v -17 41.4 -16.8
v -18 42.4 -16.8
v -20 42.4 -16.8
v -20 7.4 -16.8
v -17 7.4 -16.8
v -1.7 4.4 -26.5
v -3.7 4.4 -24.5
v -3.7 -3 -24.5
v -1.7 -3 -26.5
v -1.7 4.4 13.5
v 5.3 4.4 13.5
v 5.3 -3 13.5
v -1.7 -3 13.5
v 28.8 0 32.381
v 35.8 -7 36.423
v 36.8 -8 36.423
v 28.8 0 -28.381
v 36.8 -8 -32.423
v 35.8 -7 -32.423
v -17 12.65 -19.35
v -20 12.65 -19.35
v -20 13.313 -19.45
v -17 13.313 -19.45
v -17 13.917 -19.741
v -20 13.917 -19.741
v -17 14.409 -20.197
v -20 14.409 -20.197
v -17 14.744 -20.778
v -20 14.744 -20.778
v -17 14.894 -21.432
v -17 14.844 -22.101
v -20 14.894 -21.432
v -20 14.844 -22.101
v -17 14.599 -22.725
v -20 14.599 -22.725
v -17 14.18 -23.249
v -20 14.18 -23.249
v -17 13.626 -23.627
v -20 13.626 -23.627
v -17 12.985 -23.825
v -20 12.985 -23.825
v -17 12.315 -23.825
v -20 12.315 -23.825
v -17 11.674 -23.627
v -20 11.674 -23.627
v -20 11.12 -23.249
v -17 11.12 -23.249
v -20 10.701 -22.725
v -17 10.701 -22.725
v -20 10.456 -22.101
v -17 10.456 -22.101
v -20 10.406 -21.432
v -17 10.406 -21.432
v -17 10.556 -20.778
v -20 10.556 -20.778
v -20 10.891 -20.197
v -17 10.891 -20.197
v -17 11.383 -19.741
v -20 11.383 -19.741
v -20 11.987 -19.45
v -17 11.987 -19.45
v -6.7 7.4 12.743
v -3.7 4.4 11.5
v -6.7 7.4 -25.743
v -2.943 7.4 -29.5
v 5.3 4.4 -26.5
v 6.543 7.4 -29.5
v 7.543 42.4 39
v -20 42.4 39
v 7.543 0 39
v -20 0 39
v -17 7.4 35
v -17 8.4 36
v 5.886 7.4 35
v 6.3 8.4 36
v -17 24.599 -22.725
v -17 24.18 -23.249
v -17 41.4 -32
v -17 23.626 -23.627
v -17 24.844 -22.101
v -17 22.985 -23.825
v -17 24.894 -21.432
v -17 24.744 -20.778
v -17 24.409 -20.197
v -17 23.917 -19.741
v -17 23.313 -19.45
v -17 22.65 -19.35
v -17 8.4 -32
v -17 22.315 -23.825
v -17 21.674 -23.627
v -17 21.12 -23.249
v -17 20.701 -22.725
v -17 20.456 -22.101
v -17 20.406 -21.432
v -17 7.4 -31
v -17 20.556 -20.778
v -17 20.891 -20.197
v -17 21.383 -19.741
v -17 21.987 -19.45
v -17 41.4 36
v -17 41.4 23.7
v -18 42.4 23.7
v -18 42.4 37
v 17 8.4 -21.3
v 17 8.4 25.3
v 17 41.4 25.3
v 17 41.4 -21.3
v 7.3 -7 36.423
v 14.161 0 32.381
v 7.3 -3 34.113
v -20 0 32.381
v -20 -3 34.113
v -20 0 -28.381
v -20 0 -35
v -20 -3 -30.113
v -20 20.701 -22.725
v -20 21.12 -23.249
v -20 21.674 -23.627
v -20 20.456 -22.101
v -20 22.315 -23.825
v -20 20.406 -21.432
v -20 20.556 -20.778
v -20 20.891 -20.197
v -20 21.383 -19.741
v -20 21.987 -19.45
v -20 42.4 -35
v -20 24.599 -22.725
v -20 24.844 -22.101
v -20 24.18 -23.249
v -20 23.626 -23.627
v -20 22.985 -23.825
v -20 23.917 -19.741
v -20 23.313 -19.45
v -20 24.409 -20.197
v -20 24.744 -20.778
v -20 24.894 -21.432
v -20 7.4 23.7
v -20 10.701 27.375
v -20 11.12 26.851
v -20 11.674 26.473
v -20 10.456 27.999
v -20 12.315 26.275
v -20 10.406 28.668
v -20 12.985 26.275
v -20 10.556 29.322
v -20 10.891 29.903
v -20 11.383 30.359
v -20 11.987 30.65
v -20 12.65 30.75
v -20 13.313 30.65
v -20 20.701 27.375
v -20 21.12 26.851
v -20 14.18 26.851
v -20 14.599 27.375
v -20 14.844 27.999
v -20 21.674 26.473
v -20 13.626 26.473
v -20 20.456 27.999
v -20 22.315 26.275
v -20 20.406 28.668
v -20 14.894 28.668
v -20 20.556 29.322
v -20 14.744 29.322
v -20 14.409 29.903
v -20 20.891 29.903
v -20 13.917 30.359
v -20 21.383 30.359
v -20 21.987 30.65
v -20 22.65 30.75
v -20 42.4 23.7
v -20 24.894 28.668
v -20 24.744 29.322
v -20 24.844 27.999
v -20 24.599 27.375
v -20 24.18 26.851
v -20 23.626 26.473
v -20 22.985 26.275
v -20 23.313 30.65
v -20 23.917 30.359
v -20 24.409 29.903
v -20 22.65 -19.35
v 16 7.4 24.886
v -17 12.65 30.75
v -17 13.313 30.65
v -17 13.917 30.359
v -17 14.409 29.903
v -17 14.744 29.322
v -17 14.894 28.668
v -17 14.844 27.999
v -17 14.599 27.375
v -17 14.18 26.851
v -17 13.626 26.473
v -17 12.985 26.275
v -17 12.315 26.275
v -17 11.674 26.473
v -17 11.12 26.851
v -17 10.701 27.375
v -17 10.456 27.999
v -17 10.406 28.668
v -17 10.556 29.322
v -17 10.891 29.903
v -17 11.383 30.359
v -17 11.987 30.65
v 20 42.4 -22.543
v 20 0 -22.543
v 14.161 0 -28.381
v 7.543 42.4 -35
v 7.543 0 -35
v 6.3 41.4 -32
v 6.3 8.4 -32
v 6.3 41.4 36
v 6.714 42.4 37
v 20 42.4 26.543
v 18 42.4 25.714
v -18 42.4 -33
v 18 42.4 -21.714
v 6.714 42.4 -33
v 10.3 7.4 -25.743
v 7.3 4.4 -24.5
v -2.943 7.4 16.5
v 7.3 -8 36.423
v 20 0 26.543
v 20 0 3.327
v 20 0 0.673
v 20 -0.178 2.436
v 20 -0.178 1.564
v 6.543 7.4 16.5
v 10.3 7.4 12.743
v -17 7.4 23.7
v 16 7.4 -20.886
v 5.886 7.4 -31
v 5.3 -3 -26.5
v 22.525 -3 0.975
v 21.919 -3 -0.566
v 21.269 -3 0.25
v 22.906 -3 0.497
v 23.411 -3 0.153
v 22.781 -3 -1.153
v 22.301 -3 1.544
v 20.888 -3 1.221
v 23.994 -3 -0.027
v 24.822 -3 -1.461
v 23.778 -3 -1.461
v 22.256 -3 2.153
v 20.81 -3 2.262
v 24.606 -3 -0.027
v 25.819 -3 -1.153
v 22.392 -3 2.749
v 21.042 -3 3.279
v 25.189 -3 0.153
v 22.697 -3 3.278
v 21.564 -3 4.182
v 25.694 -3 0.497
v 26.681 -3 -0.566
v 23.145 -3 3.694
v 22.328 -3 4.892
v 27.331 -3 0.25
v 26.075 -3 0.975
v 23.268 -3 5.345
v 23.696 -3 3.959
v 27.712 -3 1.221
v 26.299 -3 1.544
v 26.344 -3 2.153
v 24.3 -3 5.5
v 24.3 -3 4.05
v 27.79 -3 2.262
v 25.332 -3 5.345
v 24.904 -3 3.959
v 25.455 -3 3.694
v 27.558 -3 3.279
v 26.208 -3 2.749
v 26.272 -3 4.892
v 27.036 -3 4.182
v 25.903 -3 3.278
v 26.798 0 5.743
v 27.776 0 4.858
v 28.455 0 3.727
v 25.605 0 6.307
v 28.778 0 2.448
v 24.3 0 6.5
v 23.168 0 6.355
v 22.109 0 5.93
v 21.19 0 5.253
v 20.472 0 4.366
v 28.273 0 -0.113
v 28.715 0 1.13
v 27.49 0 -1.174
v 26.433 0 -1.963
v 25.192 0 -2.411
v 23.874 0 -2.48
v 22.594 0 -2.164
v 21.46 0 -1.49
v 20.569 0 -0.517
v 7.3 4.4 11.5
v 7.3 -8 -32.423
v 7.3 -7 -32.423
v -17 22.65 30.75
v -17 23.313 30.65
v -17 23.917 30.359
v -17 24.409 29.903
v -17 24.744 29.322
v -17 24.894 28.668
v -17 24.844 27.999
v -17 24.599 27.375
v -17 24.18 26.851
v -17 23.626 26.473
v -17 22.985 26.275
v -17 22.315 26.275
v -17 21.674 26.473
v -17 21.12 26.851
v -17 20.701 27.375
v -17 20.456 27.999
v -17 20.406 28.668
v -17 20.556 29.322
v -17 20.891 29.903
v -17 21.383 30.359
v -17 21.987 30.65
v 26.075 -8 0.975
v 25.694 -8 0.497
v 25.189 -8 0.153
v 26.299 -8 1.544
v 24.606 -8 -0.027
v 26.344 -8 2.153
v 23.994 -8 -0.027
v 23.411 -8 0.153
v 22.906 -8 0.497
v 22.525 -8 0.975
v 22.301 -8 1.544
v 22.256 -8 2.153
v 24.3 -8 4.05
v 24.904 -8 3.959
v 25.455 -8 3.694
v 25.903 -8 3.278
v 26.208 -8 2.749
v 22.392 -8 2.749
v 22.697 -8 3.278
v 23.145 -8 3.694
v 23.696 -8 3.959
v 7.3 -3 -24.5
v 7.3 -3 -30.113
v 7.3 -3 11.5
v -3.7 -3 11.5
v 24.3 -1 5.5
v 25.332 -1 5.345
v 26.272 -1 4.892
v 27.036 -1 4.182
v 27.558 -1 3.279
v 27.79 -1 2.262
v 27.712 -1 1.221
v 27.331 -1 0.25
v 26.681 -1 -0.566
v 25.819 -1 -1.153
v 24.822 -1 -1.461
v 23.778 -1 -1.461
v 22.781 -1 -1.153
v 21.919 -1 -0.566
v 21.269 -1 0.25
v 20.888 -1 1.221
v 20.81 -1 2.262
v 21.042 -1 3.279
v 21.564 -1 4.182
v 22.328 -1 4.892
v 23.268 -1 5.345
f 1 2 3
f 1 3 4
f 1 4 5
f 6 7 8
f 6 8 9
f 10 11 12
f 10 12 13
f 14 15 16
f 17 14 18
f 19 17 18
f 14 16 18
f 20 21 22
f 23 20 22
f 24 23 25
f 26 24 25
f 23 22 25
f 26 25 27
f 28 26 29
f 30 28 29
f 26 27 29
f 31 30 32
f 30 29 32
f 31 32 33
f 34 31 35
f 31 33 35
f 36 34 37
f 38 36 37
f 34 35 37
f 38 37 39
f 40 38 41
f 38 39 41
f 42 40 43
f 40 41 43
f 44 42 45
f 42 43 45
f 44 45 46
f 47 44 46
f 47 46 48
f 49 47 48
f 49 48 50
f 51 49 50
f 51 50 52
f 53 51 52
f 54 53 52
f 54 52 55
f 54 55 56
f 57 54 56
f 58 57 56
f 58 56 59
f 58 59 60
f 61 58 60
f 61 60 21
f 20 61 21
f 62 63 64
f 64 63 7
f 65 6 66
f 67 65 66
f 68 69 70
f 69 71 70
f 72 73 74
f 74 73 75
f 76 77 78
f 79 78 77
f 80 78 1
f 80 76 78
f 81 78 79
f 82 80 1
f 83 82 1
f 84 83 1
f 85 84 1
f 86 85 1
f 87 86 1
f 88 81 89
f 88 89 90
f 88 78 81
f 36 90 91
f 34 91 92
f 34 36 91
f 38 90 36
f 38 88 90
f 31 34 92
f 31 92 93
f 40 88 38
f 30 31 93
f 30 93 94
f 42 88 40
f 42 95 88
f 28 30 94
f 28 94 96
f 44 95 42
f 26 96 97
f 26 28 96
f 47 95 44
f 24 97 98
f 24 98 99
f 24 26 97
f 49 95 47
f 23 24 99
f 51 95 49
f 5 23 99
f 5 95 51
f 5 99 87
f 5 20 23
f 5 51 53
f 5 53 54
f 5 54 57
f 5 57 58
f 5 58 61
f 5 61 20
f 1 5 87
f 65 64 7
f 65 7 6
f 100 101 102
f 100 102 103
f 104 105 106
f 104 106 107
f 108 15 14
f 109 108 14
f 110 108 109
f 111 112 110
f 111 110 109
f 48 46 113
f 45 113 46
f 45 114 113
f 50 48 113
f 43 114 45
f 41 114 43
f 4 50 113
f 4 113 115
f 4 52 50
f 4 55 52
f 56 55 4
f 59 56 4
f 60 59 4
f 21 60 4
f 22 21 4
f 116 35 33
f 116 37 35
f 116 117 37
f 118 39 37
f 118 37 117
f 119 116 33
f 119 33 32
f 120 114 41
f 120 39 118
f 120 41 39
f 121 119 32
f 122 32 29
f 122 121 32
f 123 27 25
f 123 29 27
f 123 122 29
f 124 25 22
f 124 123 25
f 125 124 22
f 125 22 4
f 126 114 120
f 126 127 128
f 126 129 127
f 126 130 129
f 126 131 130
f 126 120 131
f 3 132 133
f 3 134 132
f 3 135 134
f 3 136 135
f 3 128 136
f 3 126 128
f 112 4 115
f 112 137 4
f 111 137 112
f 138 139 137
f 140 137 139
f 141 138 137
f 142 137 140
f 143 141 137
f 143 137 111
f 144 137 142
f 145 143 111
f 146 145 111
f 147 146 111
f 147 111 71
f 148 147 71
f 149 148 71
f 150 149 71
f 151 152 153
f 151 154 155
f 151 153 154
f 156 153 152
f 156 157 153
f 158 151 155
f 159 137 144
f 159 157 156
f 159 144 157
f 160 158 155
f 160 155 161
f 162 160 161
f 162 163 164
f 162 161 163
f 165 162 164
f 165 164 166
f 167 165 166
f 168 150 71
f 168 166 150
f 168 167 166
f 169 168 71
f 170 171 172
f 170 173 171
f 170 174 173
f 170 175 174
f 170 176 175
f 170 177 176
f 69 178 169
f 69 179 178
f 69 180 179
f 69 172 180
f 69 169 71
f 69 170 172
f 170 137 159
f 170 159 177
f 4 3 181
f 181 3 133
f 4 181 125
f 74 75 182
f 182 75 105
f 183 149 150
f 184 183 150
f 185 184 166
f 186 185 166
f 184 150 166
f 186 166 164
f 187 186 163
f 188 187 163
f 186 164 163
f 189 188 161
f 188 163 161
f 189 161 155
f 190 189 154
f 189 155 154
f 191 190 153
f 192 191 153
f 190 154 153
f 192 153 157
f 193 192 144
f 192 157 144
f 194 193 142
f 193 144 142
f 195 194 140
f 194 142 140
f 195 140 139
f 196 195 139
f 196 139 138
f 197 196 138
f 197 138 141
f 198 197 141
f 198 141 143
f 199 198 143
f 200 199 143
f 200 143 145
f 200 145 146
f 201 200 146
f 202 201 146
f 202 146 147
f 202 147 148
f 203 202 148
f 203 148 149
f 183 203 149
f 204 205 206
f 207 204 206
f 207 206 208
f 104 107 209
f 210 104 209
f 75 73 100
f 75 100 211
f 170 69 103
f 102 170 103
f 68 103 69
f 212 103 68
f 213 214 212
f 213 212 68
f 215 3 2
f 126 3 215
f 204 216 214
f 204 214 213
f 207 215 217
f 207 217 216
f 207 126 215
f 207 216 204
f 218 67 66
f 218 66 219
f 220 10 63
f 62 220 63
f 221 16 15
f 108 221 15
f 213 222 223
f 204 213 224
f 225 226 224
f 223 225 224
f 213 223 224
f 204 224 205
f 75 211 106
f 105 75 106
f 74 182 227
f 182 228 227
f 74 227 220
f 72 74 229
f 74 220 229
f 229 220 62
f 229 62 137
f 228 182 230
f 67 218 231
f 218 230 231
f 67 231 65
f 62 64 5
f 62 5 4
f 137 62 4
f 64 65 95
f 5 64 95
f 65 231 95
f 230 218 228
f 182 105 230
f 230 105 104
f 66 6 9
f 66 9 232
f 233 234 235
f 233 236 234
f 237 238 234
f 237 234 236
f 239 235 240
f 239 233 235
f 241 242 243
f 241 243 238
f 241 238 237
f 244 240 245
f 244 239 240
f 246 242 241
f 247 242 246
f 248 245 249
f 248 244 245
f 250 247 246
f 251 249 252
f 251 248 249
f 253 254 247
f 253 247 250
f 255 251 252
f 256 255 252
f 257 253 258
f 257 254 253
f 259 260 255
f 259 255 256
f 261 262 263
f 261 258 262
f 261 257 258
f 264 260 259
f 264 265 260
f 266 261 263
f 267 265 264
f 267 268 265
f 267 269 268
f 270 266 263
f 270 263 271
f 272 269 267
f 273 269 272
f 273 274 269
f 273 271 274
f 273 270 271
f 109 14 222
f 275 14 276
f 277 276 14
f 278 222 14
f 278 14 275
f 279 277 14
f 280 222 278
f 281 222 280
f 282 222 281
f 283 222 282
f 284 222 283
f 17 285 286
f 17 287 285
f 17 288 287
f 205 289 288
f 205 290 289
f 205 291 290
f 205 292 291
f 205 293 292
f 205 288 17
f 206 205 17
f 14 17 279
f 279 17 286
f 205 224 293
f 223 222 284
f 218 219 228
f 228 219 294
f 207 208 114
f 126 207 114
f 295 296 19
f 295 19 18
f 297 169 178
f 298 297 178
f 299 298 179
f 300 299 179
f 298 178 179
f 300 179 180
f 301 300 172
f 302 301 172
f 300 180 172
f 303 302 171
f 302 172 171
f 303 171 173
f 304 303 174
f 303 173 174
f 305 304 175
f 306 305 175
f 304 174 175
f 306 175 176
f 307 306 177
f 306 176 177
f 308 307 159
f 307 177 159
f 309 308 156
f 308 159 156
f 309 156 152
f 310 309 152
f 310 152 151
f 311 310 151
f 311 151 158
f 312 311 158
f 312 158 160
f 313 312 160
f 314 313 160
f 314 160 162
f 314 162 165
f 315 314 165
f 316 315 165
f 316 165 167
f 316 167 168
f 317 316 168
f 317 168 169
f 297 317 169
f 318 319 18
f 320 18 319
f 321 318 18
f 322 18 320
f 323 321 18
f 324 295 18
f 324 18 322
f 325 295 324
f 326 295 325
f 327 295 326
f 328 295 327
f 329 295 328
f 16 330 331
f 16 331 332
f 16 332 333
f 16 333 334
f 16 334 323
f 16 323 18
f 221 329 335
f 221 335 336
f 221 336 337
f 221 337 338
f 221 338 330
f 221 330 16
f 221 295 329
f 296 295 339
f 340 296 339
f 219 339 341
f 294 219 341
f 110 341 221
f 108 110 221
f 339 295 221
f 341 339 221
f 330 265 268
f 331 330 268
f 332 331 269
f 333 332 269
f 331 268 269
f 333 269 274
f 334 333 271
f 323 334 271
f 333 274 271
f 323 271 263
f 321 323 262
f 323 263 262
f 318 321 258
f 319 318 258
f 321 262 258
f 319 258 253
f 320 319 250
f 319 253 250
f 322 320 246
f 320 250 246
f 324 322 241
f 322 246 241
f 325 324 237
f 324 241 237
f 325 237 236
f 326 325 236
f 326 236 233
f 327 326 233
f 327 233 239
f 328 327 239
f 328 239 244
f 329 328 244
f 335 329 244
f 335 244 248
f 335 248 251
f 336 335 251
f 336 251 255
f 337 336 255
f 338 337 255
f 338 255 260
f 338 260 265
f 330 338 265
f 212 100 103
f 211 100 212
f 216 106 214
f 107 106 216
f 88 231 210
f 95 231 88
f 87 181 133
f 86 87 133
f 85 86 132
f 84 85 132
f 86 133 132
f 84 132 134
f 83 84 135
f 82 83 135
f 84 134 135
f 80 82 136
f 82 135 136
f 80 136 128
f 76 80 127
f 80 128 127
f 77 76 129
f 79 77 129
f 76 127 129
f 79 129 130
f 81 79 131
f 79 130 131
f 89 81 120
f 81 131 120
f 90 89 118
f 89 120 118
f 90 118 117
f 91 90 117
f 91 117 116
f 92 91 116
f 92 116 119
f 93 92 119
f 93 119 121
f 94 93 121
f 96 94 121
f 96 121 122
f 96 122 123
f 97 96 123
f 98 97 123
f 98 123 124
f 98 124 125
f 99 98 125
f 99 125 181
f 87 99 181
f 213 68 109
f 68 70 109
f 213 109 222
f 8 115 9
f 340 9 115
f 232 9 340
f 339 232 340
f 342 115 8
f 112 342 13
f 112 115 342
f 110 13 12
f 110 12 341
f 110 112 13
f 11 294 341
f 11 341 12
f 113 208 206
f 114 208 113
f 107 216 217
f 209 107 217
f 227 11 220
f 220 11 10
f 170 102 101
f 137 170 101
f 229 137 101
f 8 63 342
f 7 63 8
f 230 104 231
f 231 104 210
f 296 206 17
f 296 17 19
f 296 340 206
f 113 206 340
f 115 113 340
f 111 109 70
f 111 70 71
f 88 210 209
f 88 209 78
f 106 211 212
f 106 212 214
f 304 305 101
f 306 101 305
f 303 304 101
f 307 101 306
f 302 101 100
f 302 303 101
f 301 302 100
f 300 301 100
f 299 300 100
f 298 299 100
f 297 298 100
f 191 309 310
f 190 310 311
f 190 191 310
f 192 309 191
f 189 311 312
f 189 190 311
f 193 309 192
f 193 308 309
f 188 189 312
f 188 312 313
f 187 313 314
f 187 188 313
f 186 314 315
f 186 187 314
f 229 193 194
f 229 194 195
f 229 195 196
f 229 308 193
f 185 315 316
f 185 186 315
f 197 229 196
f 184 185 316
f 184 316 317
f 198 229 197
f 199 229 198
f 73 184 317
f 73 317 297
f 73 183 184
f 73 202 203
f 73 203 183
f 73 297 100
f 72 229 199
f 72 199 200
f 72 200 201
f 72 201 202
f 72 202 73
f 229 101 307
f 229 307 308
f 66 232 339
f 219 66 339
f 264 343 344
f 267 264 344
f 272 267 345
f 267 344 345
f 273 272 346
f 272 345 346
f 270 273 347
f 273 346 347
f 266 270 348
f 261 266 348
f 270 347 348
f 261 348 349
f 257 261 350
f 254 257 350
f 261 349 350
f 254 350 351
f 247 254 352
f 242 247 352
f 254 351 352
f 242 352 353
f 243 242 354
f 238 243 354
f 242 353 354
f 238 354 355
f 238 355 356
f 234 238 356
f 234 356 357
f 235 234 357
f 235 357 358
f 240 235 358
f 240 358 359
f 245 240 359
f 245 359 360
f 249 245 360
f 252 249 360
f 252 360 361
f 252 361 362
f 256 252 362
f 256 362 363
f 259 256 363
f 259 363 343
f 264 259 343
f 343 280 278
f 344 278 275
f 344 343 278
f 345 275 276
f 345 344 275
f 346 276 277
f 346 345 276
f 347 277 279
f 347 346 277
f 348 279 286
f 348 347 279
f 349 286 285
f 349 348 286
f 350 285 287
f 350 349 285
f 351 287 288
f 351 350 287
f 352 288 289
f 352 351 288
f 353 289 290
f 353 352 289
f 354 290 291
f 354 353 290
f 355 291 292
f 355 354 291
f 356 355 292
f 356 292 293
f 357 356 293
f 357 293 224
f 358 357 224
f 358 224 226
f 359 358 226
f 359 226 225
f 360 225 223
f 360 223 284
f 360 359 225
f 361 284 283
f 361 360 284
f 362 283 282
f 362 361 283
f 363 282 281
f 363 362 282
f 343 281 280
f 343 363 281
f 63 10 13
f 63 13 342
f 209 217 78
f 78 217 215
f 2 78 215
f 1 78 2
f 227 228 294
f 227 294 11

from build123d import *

# Parameters (mm, degrees)
MAIN_FACE_EXTRUDE_DEPTH              = 7.4
MAIN_WALLS_EXTRUDE_DEPTH             = 35
MAIN_WALLS_LOWER_CHAMFER_SIZE        = 1
MAIN_WALLS_ENTRY_CHAMFER_SIZE        = 1
SKETCH4_W                            = 3
SKETCH4_H                            = 40.5
SERVO_MOUNT_CUT_DEPTH                = 35
SERVO_MOUNT_HOLES_REACH              = 72.134
SKETCH5_R                            = 2.25
MOUNT_DOVETAIL_DEPTH                 = 56.8
MOUNT_DOVETAIL_CHAMFER_SIZE          = 8
SKETCH9_W                            = 27.3
SKETCH9_H                            = 68.845299462
DOVETAIL_OFFSET_CUT_DEPTH            = 5
SKETCH10_R                           = 2.05
MOUNT_SCREW_HOLE_DEPTH               = 69.359344643
SKETCH11_R                           = 3.5
MOUNT_SCREW_COUNTERSINK_DEPTH        = 3
MOUNT_SCREW_COUNTERSINK_CHAMFER_SIZE = 1
GEAR_CUT_DEPTH                       = 65.033116432
GEAR_ENTRY_CHAMFER_SIZE              = 3


# Some blends are built 0.0001 mm under size
with BuildPart() as part:
    # Sketch1 → Main Face Extrude (new body)
    with BuildSketch(Plane(origin=(0, 0, 0), x_dir=(1, 0, 0), z_dir=(0, 1, 0))):
        Polygon((-20, 35), (7.542640687, 35), (20, 22.542640687), (20, -26.542640687), (7.542640687, -39), (-20, -39), align=None)
    extrude(amount=MAIN_FACE_EXTRUDE_DEPTH)

    # Sketch3 → Main Walls Extrude (add)
    with BuildSketch(Plane(origin=(0, 7.4, 0), x_dir=(1, 0, 0), z_dir=(0, 1, 0))):
        Polygon((-20, 35), (-20, -39), (7.542640687, -39), (20, -26.542640687), (20, 22.542640687), (7.542640687, 35), align=None)
        Polygon((-17, 32), (-17, -36), (6.3, -36), (17, -25.3), (17, 21.3), (6.3, 32), align=None, mode=Mode.SUBTRACT)
    extrude(amount=MAIN_WALLS_EXTRUDE_DEPTH)

    # Main Walls Lower Chamfer
    main_walls_lower_chamfer_edges = [part.edges().sort_by_distance(p)[0] for p in [
        (-5.35, 7.4, -32),
        (-5.35, 7.4, 36),
        (11.65, 7.4, 30.65),
        (17, 7.4, 2),
        (11.65, 7.4, -26.65),
    ]]
    chamfer(main_walls_lower_chamfer_edges, length=MAIN_WALLS_LOWER_CHAMFER_SIZE)

    # Main Walls Entry Chamfer
    main_walls_entry_chamfer_edges = [part.edges().sort_by_distance(p)[0] for p in [
        (-5.35, 42.4, -32),
        (-17, 42.4, 2),
        (-5.35, 42.4, 36),
        (11.65, 42.4, 30.65),
        (17, 42.4, 2),
        (11.65, 42.4, -26.65),
    ]]
    chamfer(main_walls_entry_chamfer_edges, length=MAIN_WALLS_ENTRY_CHAMFER_SIZE)

    # Sketch4 → Servo Mount Cut (cut)
    with BuildSketch(Plane(origin=(0, 42.4, 0), x_dir=(1, 0, 0), z_dir=(0, 1, 0))):
        with Locations((-18.5, -3.45)):
            Rectangle(SKETCH4_W, SKETCH4_H)
    extrude(amount=-SERVO_MOUNT_CUT_DEPTH, mode=Mode.SUBTRACT)

    # Sketch5 → Servo Mount Holes (cut, up to next)
    with BuildSketch(Plane.ZY.offset(20), mode=Mode.PRIVATE) as servo_mount_holes_sk1:
        with Locations((-21.6, 22.65)):
            Circle(SKETCH5_R)
    servo_mount_holes_tool1 = extrude(servo_mount_holes_sk1.sketch, amount=-SERVO_MOUNT_HOLES_REACH, mode=Mode.PRIVATE) & part.part
    # Sketch5 → Servo Mount Holes (cut, up to next)
    with BuildSketch(Plane.ZY.offset(20), mode=Mode.PRIVATE) as servo_mount_holes_sk2:
        with Locations((-21.6, 12.65)):
            Circle(SKETCH5_R)
    servo_mount_holes_tool2 = extrude(servo_mount_holes_sk2.sketch, amount=-SERVO_MOUNT_HOLES_REACH, mode=Mode.PRIVATE) & part.part
    # Sketch5 → Servo Mount Holes (cut, up to next)
    with BuildSketch(Plane.ZY.offset(20), mode=Mode.PRIVATE) as servo_mount_holes_sk3:
        with Locations((28.5, 22.65)):
            Circle(SKETCH5_R)
    servo_mount_holes_tool3 = extrude(servo_mount_holes_sk3.sketch, amount=-SERVO_MOUNT_HOLES_REACH, mode=Mode.PRIVATE) & part.part
    # Sketch5 → Servo Mount Holes (cut, up to next)
    with BuildSketch(Plane.ZY.offset(20), mode=Mode.PRIVATE) as servo_mount_holes_sk4:
        with Locations((28.5, 12.65)):
            Circle(SKETCH5_R)
    servo_mount_holes_tool4 = extrude(servo_mount_holes_sk4.sketch, amount=-SERVO_MOUNT_HOLES_REACH, mode=Mode.PRIVATE) & part.part
    add(servo_mount_holes_tool1.solids().sort_by_distance((-20, 22.65, -21.6))[0], mode=Mode.SUBTRACT)
    add(servo_mount_holes_tool2.solids().sort_by_distance((-20, 12.65, -21.6))[0], mode=Mode.SUBTRACT)
    add(servo_mount_holes_tool3.solids().sort_by_distance((-20, 22.65, 28.5))[0], mode=Mode.SUBTRACT)
    add(servo_mount_holes_tool4.solids().sort_by_distance((-20, 12.65, 28.5))[0], mode=Mode.SUBTRACT)

    # Sketch8 → Mount Dovetail (add)
    with BuildSketch(Plane.ZY.offset(20)):
        Polygon((-28.381197846, 0), (-32.422649731, -7), (-32.422649731, -8), (36.422649731, -8), (36.422649731, -7), (32.381197846, 0), align=None)
    extrude(amount=-MOUNT_DOVETAIL_DEPTH)

    # Mount Dovetail Chamfer
    mount_dovetail_chamfer_edges = [part.edges().sort_by_distance(p)[0] for p in [
        (36.8, 0, 2),
    ]]
    chamfer(mount_dovetail_chamfer_edges, length=MOUNT_DOVETAIL_CHAMFER_SIZE - 0.0001)  # a hair under: the kernel refuses the full size

    # Sketch9 → Dovetail Offset Cut (cut)
    with BuildSketch(Plane.XZ.offset(8)):
        with Locations((-6.35, 2)):
            Rectangle(SKETCH9_W, SKETCH9_H)
    extrude(amount=-DOVETAIL_OFFSET_CUT_DEPTH, mode=Mode.SUBTRACT)

    # Sketch10 → Mount Screw Hole (cut, through all)
    with BuildSketch(Plane(origin=(0, 0, 0), x_dir=(1, 0, 0), z_dir=(0, 1, 0))):
        with Locations(Location((24.3, -2, 0), (0, 0, 270))):
            Circle(SKETCH10_R)
    extrude(amount=-MOUNT_SCREW_HOLE_DEPTH, mode=Mode.SUBTRACT)

    # Sketch11 → Mount Screw Countersink (cut)
    with BuildSketch(Plane(origin=(0, 0, 0), x_dir=(1, 0, 0), z_dir=(0, 1, 0))):
        with Locations(Location((24.3, -2, 0), (0, 0, 270))):
            Circle(SKETCH11_R)
    extrude(amount=-MOUNT_SCREW_COUNTERSINK_DEPTH, mode=Mode.SUBTRACT)

    # Mount Screw Countersink Chamfer
    # the kernel refuses this chamfer: 1 mm, written as the material it takes off along each edge
    with BuildSketch(Plane(origin=(24.3, 0, 2), x_dir=(0, 0, 1), z_dir=(-1, 0, 0))) as mount_screw_countersink_chamfer_piece_1_section:
        Polygon((3.5 + MOUNT_SCREW_COUNTERSINK_CHAMFER_SIZE, 0), (3.5, -MOUNT_SCREW_COUNTERSINK_CHAMFER_SIZE), (3.5, 0), align=None)
    mount_screw_countersink_chamfer_piece_1 = revolve(axis=Axis((24.3, 0, 2), (0, 1, 0)), mode=Mode.PRIVATE)
    mount_screw_countersink_chamfer_piece_1 = split(mount_screw_countersink_chamfer_piece_1, bisect_by=Plane(origin=(20, -0.483290811, -1.983290811), z_dir=(1, 0, 0)), keep=Keep.TOP, mode=Mode.PRIVATE)
    add(mount_screw_countersink_chamfer_piece_1, mode=Mode.SUBTRACT)

    # Sketch2 → Gear Cut (cut, through all)
    with BuildSketch(Plane(origin=(0, 7.4, 0), x_dir=(1, 0, 0), z_dir=(0, 1, 0))):
        Polygon((-1.7, 26.5), (5.3, 26.5), (7.3, 24.5), (7.3, -11.5), (5.3, -13.5), (-1.7, -13.5), (-3.7, -11.5), (-3.7, 24.5), align=None)
    extrude(amount=-GEAR_CUT_DEPTH, mode=Mode.SUBTRACT)

    # Gear Entry Chamfer
    gear_entry_chamfer_edges = [part.edges().sort_by_distance(p)[0] for p in [
        (-2.7, 7.4, -25.5),
        (-3.7, 7.4, -6.5),
        (-2.7, 7.4, 12.5),
        (1.8, 7.4, 13.5),
        (6.3, 7.4, 12.5),
        (7.3, 7.4, -6.5),
        (6.3, 7.4, -25.5),
        (1.8, 7.4, -26.5),
    ]]
    chamfer(gear_entry_chamfer_edges, length=GEAR_ENTRY_CHAMFER_SIZE)


solid = part.part
